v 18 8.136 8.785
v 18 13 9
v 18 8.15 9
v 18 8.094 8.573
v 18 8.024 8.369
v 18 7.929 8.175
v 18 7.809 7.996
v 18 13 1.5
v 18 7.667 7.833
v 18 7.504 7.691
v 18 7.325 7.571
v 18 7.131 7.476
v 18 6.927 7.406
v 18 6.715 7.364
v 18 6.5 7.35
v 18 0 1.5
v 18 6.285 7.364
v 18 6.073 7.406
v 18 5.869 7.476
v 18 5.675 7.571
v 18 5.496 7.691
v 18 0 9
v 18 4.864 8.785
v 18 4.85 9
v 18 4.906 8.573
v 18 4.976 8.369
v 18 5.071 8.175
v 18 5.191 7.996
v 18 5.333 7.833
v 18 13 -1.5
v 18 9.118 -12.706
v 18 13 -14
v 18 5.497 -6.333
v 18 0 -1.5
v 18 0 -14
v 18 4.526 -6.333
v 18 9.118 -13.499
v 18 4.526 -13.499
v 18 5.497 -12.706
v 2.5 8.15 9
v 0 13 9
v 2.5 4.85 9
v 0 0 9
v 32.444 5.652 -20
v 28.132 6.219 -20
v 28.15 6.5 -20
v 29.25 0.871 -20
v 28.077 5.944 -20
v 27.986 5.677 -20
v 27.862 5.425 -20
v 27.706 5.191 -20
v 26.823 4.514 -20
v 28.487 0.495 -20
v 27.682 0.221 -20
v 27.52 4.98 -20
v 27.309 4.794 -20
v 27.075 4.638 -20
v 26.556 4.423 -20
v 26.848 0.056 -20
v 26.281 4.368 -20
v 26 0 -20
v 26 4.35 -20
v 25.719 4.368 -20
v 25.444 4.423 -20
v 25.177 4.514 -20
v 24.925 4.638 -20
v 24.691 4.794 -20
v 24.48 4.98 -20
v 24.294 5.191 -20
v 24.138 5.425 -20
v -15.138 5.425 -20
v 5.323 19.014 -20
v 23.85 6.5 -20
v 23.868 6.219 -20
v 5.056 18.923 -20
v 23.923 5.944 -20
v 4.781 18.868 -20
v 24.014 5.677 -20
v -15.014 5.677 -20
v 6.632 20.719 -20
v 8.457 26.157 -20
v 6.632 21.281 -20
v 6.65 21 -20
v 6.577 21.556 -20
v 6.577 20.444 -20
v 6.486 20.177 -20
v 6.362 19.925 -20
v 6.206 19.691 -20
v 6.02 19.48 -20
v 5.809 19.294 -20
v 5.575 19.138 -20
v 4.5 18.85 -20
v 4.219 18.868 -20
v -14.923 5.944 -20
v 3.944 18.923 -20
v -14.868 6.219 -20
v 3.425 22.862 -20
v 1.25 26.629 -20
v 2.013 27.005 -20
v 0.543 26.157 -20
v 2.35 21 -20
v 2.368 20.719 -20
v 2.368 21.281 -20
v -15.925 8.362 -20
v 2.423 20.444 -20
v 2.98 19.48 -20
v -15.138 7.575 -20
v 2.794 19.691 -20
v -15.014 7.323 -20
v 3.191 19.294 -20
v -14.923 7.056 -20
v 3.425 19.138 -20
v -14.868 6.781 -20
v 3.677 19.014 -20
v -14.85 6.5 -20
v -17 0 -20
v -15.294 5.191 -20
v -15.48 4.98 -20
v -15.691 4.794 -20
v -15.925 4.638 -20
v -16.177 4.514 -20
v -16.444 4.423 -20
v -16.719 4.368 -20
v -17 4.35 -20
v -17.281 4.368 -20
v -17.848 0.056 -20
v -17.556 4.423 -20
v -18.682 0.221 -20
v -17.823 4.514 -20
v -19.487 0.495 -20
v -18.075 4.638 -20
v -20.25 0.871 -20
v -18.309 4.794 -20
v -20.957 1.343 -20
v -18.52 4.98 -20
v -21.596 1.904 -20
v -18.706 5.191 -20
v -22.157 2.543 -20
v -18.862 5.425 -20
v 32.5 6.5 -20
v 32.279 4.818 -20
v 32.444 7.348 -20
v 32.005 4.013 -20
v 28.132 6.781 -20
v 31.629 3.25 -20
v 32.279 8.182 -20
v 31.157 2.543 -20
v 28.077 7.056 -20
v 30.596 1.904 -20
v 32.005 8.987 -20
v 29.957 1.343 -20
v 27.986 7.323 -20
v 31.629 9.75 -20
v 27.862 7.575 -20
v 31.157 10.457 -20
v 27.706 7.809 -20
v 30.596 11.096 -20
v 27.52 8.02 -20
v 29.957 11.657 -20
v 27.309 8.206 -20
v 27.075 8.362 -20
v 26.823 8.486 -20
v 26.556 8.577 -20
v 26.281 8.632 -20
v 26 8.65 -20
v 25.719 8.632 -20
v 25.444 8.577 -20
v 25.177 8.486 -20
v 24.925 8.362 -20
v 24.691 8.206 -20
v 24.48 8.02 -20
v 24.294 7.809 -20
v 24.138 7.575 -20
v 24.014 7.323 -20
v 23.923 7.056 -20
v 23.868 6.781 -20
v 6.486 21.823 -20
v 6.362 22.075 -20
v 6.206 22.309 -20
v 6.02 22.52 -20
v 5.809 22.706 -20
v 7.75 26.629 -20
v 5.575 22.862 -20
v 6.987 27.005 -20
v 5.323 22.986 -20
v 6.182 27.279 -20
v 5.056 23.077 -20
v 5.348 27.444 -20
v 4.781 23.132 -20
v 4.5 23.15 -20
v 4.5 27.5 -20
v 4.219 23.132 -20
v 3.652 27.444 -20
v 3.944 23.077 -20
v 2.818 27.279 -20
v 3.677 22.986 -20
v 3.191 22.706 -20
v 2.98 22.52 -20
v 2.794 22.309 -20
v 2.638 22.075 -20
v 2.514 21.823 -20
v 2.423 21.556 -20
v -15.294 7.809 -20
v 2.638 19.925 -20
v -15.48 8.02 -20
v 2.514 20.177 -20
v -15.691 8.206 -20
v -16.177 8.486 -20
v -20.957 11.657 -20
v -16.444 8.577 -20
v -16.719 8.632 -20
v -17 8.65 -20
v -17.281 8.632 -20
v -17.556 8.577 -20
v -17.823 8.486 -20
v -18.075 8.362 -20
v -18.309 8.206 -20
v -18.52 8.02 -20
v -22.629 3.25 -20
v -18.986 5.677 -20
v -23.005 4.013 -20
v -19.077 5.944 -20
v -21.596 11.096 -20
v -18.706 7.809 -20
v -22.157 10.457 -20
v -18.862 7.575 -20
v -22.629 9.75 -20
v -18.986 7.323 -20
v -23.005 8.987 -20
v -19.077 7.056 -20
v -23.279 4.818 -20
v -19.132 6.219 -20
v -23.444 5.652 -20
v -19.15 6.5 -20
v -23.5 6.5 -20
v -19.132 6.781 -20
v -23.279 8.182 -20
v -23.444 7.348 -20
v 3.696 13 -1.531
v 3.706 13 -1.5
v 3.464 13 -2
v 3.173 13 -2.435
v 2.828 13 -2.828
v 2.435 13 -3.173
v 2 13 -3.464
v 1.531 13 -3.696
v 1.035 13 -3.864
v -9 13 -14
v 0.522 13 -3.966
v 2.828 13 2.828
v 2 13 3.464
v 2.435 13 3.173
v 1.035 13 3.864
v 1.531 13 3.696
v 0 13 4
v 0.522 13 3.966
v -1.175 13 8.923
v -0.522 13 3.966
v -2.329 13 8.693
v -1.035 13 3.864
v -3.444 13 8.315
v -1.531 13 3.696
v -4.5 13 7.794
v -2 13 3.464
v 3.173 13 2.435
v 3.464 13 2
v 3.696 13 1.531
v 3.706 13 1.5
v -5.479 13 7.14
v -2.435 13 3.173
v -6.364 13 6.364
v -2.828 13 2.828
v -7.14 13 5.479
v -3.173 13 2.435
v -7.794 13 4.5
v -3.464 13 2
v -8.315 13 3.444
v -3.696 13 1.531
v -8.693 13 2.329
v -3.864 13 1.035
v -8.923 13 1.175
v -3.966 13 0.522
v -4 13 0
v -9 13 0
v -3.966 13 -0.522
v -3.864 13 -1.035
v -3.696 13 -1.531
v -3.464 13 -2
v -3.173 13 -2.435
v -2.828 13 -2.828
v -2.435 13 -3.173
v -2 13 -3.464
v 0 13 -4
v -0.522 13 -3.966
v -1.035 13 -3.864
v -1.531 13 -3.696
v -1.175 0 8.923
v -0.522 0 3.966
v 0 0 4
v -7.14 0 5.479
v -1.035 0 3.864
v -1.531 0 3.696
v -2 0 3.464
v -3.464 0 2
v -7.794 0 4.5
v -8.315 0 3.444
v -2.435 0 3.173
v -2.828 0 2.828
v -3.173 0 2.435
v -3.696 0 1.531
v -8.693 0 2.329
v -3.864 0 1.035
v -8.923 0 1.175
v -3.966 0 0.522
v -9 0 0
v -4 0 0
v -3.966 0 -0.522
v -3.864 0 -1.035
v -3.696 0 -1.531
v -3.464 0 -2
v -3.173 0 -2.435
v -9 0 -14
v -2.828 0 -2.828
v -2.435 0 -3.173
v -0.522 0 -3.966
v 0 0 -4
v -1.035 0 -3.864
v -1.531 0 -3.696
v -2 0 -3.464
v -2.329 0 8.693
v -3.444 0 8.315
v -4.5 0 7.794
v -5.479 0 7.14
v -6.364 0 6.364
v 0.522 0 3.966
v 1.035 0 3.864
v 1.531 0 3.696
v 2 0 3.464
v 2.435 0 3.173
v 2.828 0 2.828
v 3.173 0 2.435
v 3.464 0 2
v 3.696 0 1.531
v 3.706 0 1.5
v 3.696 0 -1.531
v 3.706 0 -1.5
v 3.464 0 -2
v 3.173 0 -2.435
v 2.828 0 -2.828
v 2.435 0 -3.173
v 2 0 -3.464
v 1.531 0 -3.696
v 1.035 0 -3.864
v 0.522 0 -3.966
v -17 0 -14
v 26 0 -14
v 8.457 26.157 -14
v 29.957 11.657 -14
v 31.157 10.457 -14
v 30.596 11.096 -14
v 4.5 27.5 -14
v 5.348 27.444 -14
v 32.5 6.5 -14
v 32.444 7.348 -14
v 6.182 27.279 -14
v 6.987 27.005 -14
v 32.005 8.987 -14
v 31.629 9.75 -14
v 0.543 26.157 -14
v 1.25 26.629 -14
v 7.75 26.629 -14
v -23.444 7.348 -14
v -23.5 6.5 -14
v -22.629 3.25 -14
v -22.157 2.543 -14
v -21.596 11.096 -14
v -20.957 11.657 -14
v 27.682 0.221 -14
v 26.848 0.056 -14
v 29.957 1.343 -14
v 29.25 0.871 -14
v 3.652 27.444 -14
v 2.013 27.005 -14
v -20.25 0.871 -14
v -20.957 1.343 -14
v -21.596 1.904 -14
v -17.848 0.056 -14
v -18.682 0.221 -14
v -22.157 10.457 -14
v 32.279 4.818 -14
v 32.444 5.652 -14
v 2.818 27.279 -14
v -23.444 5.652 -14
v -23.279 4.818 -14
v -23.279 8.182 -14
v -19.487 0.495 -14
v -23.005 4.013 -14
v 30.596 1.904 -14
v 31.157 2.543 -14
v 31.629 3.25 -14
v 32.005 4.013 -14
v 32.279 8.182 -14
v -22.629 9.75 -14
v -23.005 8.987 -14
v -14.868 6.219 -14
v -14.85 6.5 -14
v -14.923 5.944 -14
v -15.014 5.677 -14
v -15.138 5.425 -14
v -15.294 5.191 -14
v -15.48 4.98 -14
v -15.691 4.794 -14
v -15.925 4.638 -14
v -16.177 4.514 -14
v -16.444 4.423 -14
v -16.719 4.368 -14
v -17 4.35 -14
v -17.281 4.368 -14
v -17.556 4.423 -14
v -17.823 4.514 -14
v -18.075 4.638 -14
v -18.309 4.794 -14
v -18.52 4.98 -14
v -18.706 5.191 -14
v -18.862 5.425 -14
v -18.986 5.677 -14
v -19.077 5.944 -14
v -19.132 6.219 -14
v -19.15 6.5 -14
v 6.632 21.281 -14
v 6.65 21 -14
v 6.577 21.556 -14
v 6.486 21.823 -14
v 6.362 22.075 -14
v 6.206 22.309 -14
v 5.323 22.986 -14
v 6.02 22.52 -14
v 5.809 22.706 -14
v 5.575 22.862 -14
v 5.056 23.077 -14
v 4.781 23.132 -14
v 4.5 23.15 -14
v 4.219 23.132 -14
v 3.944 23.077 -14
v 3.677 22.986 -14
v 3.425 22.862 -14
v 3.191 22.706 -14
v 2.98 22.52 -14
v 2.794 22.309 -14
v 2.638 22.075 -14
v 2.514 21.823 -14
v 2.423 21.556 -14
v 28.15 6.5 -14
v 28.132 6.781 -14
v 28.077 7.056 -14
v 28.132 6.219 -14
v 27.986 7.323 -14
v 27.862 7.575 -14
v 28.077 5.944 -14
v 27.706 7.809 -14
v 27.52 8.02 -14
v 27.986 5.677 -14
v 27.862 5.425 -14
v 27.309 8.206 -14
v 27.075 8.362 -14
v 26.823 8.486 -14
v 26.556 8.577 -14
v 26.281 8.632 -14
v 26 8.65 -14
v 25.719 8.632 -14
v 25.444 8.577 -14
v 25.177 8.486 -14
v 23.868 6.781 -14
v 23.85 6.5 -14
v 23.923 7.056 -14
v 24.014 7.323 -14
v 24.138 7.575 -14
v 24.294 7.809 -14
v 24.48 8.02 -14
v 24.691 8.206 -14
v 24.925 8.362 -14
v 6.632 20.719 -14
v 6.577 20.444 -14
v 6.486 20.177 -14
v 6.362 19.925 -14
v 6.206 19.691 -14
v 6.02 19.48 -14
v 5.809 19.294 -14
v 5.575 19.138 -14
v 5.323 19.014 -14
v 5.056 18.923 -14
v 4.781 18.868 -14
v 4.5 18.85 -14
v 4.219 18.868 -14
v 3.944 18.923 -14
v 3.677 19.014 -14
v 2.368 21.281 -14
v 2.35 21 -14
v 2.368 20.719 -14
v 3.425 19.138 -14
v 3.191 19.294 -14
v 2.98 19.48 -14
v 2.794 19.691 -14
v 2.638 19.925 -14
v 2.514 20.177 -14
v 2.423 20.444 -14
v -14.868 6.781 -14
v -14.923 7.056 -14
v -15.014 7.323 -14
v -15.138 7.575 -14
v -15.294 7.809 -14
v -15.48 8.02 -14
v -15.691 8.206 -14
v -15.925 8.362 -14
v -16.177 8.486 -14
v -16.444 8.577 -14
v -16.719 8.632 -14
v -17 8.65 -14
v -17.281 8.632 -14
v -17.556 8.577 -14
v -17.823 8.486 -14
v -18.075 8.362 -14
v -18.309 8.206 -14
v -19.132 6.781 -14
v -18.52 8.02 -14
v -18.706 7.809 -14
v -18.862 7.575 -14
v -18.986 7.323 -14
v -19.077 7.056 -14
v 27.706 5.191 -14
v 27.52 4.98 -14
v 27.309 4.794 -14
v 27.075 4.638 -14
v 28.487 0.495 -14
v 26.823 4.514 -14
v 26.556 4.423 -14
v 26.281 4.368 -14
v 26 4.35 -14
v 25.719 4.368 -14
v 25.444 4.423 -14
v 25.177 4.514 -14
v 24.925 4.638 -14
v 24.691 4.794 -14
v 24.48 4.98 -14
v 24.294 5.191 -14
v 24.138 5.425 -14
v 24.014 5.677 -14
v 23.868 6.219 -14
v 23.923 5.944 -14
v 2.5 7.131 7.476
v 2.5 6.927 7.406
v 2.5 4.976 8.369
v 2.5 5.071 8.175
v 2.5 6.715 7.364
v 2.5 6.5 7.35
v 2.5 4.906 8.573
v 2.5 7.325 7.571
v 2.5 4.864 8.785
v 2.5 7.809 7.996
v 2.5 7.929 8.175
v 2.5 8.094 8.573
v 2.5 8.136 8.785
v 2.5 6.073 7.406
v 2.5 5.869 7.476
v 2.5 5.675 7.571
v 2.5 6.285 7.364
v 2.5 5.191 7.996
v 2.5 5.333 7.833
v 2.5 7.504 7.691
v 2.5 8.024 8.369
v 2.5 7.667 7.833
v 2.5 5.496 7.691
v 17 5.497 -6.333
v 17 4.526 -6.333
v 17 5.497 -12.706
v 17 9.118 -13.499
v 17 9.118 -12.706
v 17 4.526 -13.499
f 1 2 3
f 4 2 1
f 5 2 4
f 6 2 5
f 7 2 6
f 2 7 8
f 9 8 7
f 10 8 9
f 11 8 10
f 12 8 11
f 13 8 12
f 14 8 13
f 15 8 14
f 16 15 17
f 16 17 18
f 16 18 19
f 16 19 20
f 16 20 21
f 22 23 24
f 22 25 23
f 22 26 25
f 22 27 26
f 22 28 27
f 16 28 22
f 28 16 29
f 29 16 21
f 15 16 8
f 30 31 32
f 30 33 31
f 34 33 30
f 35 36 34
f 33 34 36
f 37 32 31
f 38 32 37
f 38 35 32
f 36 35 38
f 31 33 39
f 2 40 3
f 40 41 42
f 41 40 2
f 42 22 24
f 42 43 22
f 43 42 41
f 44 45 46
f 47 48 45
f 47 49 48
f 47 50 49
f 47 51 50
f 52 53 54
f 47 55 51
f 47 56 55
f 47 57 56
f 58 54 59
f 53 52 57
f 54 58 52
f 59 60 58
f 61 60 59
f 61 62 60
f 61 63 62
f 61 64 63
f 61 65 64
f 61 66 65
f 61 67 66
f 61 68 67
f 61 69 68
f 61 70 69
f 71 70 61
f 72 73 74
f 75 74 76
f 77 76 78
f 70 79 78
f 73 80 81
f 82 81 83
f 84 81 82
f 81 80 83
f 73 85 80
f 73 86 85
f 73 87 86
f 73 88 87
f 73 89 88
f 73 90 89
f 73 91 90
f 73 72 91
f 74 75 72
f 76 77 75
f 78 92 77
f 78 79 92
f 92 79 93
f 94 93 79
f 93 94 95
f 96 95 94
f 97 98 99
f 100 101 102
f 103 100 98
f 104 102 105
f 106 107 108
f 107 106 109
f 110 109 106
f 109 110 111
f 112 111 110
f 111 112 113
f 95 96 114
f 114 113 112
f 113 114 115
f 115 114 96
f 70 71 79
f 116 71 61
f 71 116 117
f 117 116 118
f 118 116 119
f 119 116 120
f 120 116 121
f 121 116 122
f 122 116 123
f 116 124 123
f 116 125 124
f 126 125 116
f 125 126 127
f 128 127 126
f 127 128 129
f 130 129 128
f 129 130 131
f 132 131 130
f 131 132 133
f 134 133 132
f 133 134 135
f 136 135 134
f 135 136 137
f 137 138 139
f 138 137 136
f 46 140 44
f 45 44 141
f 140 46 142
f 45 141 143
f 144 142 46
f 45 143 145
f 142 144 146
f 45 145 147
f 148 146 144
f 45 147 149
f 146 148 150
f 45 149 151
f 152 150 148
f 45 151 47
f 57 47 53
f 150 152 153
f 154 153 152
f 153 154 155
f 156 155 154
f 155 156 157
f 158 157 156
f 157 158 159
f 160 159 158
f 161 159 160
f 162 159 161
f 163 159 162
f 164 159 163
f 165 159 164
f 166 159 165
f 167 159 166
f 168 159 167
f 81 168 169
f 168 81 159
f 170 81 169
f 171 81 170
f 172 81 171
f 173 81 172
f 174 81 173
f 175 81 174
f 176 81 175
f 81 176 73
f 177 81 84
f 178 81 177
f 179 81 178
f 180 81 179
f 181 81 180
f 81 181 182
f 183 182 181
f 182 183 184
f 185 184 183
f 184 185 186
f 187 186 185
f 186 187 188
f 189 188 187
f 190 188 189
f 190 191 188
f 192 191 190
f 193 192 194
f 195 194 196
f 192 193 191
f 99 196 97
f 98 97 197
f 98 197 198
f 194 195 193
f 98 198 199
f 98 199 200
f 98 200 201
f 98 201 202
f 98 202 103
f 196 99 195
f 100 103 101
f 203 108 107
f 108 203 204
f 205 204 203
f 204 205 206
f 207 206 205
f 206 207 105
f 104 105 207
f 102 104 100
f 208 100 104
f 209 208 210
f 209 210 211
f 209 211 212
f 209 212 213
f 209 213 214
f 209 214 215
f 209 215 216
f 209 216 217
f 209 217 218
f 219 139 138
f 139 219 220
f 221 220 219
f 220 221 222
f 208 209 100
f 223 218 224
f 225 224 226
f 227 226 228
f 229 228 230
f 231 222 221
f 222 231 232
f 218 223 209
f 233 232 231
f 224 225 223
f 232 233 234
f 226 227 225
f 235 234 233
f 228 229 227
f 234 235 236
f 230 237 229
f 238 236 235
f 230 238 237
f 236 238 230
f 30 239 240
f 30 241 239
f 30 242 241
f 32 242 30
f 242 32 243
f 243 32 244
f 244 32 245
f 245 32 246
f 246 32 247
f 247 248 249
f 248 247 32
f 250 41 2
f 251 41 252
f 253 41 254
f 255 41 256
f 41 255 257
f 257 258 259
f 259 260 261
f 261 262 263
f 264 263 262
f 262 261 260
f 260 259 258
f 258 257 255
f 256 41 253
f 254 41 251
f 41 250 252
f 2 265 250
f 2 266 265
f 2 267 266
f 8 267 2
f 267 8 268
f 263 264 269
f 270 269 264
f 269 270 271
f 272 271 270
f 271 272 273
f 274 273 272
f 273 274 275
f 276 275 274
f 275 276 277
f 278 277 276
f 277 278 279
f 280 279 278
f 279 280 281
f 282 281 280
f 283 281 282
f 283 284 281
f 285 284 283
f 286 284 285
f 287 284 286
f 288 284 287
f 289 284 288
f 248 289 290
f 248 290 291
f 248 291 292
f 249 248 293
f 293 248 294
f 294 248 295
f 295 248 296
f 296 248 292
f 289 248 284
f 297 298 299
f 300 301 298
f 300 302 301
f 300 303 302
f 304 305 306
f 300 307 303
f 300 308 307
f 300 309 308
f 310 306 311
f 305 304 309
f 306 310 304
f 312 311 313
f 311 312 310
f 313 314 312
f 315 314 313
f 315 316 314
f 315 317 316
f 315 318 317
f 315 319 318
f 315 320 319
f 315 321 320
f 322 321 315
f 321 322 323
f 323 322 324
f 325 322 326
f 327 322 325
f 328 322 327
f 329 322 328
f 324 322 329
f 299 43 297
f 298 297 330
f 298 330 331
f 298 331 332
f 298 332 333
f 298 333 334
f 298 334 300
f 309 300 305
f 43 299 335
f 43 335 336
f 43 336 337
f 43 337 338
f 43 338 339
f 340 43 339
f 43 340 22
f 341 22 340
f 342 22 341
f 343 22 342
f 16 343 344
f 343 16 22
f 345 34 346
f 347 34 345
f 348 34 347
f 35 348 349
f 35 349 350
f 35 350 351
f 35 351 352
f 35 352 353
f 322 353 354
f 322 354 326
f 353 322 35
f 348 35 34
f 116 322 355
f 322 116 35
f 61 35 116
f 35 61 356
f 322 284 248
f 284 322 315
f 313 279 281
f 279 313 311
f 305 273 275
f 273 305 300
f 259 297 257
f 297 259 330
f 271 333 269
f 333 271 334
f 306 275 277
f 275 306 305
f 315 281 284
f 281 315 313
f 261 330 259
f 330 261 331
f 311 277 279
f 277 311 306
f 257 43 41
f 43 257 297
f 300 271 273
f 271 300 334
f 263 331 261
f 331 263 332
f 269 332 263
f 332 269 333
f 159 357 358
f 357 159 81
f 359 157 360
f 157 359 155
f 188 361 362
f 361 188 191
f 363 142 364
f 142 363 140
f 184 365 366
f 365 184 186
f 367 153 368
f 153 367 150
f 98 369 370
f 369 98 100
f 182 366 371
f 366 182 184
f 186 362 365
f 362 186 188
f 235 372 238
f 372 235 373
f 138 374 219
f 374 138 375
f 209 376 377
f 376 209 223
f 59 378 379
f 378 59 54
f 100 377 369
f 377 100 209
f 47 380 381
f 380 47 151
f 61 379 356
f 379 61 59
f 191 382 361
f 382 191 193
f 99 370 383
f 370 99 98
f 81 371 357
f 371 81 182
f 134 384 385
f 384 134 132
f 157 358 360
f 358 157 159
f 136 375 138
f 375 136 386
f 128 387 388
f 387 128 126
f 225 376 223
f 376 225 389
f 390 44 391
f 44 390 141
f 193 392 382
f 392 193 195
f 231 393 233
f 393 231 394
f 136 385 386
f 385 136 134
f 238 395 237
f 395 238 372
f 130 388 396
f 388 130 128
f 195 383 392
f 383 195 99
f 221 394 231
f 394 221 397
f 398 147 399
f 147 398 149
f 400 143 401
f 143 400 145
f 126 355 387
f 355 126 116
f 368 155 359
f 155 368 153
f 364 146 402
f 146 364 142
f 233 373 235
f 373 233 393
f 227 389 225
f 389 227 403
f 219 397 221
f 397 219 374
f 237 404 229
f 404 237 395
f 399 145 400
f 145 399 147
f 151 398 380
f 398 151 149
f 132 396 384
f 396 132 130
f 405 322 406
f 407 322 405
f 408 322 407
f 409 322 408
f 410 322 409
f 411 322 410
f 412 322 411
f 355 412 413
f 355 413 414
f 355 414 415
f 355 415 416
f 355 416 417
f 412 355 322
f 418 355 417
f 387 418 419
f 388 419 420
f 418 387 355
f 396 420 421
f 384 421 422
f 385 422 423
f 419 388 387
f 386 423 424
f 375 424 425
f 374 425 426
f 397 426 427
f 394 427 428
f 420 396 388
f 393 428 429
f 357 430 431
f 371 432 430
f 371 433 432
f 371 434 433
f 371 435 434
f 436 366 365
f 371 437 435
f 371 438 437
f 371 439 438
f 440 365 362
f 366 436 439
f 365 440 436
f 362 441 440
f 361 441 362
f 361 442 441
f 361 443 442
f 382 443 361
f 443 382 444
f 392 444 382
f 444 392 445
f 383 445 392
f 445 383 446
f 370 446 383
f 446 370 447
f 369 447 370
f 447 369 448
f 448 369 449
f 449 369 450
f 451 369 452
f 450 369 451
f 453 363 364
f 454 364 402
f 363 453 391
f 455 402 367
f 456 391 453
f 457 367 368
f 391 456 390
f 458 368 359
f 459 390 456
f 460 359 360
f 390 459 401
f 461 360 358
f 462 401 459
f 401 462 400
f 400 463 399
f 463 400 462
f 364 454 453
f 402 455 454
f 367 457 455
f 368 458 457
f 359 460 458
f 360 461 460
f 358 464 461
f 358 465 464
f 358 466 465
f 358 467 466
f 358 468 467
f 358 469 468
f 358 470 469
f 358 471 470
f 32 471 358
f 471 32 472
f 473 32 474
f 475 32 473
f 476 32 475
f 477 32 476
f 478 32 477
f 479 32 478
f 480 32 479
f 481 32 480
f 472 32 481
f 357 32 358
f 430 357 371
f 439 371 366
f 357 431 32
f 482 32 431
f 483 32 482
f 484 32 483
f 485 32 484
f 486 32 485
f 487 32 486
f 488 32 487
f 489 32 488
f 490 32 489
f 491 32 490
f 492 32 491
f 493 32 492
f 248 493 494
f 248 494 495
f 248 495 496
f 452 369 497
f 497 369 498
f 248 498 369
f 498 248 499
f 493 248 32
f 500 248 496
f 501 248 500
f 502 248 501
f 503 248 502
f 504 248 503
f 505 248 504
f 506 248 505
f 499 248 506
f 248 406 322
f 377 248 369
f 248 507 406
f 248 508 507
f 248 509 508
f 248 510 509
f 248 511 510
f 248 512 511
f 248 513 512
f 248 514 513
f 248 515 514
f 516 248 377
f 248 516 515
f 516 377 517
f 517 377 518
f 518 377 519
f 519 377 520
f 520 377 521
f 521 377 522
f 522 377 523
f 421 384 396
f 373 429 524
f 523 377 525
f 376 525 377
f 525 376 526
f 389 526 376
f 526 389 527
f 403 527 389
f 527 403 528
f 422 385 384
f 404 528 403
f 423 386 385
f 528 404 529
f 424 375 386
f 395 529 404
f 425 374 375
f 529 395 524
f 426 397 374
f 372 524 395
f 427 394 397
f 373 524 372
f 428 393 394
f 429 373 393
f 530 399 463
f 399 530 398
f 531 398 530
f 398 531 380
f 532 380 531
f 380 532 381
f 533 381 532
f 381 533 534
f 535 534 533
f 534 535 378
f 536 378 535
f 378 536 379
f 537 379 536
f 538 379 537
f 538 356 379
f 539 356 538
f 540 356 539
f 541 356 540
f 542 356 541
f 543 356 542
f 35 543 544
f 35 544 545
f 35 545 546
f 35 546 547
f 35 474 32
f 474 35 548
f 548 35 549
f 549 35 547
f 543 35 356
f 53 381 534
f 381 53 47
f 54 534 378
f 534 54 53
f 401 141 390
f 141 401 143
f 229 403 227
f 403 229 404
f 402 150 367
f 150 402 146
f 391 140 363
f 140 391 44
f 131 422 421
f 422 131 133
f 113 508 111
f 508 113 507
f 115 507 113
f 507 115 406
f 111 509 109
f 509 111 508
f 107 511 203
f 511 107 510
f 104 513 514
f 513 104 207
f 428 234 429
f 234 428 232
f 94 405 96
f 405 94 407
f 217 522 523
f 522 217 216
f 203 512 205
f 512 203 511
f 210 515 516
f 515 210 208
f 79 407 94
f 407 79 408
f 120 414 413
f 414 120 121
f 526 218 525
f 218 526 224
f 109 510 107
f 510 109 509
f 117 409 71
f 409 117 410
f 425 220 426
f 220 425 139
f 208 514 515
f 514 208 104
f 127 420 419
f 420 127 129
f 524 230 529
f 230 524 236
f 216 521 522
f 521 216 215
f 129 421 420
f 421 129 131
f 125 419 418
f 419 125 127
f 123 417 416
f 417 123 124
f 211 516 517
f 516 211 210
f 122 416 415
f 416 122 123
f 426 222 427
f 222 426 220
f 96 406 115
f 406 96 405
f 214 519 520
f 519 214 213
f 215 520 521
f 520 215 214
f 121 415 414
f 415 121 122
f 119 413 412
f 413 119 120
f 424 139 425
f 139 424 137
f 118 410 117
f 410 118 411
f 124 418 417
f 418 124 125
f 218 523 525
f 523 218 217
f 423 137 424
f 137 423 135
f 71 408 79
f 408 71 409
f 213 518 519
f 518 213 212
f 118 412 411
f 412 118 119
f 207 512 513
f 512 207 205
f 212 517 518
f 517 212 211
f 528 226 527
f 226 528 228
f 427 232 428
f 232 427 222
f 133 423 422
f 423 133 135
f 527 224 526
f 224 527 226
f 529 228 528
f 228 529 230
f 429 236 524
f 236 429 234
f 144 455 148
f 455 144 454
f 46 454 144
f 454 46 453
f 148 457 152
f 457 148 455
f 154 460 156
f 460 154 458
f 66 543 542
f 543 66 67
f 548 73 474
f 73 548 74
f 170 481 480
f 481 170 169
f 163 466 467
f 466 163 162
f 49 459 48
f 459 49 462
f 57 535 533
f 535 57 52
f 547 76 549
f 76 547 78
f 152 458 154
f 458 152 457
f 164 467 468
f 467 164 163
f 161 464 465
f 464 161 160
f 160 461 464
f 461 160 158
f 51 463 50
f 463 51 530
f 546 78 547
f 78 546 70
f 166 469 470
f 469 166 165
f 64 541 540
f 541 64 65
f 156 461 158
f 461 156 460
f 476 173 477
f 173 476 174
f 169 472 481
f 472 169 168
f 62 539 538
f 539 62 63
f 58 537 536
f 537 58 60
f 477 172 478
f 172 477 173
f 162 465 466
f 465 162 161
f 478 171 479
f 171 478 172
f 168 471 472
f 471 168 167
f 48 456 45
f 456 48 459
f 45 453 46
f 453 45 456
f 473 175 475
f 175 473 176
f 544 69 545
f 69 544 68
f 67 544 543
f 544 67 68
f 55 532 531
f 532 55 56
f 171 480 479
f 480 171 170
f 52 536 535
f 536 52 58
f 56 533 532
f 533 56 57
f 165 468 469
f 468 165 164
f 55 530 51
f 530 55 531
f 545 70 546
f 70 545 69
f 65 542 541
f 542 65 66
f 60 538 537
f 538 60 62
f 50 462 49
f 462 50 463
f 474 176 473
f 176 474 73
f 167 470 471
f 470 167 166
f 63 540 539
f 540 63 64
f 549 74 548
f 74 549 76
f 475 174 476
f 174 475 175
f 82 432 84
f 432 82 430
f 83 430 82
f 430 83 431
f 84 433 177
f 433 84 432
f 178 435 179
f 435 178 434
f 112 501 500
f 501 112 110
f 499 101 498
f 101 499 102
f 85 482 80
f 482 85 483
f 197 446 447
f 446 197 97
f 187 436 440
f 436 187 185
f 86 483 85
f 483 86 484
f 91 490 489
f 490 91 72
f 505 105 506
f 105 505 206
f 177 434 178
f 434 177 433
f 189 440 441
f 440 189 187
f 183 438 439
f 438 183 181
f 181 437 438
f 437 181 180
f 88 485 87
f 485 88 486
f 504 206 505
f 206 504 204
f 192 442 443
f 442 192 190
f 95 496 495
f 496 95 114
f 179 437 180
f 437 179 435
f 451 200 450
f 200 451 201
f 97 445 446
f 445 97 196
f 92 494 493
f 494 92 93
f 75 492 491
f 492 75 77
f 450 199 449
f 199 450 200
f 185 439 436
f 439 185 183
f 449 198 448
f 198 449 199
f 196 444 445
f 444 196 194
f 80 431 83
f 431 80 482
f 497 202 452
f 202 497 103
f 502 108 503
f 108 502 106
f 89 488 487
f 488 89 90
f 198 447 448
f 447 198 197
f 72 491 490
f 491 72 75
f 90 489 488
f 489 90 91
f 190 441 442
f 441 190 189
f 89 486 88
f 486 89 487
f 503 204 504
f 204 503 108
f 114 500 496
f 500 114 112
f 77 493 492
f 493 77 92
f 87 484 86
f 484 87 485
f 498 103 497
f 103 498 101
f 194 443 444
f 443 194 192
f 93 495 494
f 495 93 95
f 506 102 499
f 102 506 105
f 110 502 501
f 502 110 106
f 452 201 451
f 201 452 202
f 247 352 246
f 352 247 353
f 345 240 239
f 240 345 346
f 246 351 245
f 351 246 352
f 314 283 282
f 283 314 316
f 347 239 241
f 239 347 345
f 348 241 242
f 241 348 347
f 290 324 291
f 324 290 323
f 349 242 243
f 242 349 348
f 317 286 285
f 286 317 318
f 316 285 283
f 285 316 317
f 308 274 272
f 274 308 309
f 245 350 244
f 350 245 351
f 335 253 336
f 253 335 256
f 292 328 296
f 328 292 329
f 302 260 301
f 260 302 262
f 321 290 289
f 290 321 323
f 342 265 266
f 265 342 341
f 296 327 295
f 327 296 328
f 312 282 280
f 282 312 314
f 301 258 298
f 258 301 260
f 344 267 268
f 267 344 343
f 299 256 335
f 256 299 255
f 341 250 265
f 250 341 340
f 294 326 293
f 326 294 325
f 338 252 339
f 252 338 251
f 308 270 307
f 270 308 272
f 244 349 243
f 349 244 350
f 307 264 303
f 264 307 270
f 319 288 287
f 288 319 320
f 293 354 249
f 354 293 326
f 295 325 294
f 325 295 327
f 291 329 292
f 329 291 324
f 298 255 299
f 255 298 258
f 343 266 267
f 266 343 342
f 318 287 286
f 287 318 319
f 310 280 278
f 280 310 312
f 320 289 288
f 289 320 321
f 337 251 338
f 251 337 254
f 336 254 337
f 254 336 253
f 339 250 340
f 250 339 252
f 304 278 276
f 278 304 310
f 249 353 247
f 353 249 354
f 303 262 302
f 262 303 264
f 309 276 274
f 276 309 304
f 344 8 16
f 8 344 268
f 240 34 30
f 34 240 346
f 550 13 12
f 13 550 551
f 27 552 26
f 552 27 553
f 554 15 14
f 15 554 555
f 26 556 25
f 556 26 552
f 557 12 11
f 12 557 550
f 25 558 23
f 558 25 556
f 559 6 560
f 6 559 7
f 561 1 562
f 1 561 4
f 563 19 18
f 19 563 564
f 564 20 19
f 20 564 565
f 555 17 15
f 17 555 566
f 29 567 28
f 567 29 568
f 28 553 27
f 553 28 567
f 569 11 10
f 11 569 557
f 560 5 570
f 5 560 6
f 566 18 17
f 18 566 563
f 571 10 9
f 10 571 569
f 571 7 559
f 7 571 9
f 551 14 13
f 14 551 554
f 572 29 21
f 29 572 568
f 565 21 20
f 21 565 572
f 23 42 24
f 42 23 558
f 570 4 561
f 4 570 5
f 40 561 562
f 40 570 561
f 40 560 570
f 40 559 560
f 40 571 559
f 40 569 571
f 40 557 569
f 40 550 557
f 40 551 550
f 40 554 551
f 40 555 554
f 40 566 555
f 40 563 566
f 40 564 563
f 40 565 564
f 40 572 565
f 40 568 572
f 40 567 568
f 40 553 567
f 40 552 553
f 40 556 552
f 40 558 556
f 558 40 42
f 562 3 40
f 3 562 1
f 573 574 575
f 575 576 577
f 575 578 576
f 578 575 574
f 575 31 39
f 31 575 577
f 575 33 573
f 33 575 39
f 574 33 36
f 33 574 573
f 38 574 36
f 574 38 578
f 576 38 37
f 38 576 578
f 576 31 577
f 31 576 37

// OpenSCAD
// Cyclone-PCB-Factory Y-axis smooth-rod idler.
// Distilled from carlosgs/Cyclone-PCB-Factory/Source_files/Cycl_Y_frames.scad
// (module Cyclone_Y_leftSmoothRodIdler) — inlined dependencies so the file
// compiles standalone. Original licence: CC BY-SA 4.0.
//
// A real-world CAD part: bracket with mounting foot, a rod-holder cylinder,
// a captive-nut screw pocket, and a debossed axis label ("L" / "R"). The
// text() at the end is what motivated maquette-scad's font support — it's
// how the printed part gets stamped so an assembler can tell left from
// right without cross-referencing the manual.

// ---- parameters -------------------------------------------------------
mirrorLogo         = false;   // false = "L" stamp, true = "R"
axes_Ysmooth_rodD  = 8;
footScrewSize      = 4;
rodScrewSize       = 3;
axes_Yreference_height = 20;
frame_footThickness    = 6;
holderThickness    = 5;

$fn = 48;

// ---- derived ----------------------------------------------------------
holderOuterRadius = holderThickness + axes_Ysmooth_rodD / 2;
dimX = holderOuterRadius * 2;
dimY = 5 + footScrewSize * 2;
dimZ = axes_Yreference_height;
slotHeight = 3;
screwLength = holderOuterRadius * 2;
footSeparation = footScrewSize * 2;

// ---- part -------------------------------------------------------------
difference() {
    union() {
        translate([0, 0, -axes_Yreference_height])
            cube([dimX, dimY, dimZ + holderThickness + axes_Ysmooth_rodD / 2]);
        translate([-holderOuterRadius, 0, -axes_Yreference_height])
            cube([dimX, dimY, dimZ]);
        rotate([-90, 0, 0])
            cylinder(r = holderOuterRadius, h = dimY);
        translate([0, dimY / 2, -axes_Yreference_height])
            hull() {
                translate([-holderOuterRadius - footSeparation, 0, 0])
                    cylinder(r = dimY / 2, h = frame_footThickness);
                translate([holderOuterRadius * 2 + footSeparation, 0, 0])
                    cylinder(r = dimY / 2, h = frame_footThickness);
                translate([holderOuterRadius / 2, dimY / 2 + footSeparation, 0])
                    cylinder(r = dimY / 2, h = frame_footThickness);
            }
    }
    // rod pass-through
    rotate([-90, 0, 0])
        translate([0, 0, -1])
            cylinder(d = axes_Ysmooth_rodD, h = dimY + 2);
    // clamp slot
    translate([dimX / 2, dimY / 2, 0])
        cube([dimX + 1, dimY + 1, slotHeight], center = true);
    // clamp screw
    translate([2.5 + holderOuterRadius, dimY / 2, holderOuterRadius])
        rotate([0, 90, 0])
            translate([0, 0, -screwLength / 2])
                cylinder(d = rodScrewSize + 0.3, h = screwLength + 10);
    // foot mounting holes
    for (p = [ [-holderOuterRadius - footSeparation, 0],
               [ holderOuterRadius * 2 + footSeparation, 0],
               [ holderOuterRadius / 2, dimY / 2 + footSeparation] ])
        translate([p[0], dimY / 2 + p[1], -axes_Yreference_height - 0.1])
            cylinder(d = footScrewSize + 0.3, h = frame_footThickness + 1);
    // axis label — the reason maquette-scad now needs a font engine.
    translate([dimX, dimY / 2, -axes_Yreference_height / 2])
        rotate([0, 0, 90 + (mirrorLogo ? 180 : 0)])
            rotate([90, 0, 0])
                linear_extrude(height = 2, center = true)
                    text(mirrorLogo ? "R" : "L",
                         size = 7.5, halign = "center", valign = "center");
}
